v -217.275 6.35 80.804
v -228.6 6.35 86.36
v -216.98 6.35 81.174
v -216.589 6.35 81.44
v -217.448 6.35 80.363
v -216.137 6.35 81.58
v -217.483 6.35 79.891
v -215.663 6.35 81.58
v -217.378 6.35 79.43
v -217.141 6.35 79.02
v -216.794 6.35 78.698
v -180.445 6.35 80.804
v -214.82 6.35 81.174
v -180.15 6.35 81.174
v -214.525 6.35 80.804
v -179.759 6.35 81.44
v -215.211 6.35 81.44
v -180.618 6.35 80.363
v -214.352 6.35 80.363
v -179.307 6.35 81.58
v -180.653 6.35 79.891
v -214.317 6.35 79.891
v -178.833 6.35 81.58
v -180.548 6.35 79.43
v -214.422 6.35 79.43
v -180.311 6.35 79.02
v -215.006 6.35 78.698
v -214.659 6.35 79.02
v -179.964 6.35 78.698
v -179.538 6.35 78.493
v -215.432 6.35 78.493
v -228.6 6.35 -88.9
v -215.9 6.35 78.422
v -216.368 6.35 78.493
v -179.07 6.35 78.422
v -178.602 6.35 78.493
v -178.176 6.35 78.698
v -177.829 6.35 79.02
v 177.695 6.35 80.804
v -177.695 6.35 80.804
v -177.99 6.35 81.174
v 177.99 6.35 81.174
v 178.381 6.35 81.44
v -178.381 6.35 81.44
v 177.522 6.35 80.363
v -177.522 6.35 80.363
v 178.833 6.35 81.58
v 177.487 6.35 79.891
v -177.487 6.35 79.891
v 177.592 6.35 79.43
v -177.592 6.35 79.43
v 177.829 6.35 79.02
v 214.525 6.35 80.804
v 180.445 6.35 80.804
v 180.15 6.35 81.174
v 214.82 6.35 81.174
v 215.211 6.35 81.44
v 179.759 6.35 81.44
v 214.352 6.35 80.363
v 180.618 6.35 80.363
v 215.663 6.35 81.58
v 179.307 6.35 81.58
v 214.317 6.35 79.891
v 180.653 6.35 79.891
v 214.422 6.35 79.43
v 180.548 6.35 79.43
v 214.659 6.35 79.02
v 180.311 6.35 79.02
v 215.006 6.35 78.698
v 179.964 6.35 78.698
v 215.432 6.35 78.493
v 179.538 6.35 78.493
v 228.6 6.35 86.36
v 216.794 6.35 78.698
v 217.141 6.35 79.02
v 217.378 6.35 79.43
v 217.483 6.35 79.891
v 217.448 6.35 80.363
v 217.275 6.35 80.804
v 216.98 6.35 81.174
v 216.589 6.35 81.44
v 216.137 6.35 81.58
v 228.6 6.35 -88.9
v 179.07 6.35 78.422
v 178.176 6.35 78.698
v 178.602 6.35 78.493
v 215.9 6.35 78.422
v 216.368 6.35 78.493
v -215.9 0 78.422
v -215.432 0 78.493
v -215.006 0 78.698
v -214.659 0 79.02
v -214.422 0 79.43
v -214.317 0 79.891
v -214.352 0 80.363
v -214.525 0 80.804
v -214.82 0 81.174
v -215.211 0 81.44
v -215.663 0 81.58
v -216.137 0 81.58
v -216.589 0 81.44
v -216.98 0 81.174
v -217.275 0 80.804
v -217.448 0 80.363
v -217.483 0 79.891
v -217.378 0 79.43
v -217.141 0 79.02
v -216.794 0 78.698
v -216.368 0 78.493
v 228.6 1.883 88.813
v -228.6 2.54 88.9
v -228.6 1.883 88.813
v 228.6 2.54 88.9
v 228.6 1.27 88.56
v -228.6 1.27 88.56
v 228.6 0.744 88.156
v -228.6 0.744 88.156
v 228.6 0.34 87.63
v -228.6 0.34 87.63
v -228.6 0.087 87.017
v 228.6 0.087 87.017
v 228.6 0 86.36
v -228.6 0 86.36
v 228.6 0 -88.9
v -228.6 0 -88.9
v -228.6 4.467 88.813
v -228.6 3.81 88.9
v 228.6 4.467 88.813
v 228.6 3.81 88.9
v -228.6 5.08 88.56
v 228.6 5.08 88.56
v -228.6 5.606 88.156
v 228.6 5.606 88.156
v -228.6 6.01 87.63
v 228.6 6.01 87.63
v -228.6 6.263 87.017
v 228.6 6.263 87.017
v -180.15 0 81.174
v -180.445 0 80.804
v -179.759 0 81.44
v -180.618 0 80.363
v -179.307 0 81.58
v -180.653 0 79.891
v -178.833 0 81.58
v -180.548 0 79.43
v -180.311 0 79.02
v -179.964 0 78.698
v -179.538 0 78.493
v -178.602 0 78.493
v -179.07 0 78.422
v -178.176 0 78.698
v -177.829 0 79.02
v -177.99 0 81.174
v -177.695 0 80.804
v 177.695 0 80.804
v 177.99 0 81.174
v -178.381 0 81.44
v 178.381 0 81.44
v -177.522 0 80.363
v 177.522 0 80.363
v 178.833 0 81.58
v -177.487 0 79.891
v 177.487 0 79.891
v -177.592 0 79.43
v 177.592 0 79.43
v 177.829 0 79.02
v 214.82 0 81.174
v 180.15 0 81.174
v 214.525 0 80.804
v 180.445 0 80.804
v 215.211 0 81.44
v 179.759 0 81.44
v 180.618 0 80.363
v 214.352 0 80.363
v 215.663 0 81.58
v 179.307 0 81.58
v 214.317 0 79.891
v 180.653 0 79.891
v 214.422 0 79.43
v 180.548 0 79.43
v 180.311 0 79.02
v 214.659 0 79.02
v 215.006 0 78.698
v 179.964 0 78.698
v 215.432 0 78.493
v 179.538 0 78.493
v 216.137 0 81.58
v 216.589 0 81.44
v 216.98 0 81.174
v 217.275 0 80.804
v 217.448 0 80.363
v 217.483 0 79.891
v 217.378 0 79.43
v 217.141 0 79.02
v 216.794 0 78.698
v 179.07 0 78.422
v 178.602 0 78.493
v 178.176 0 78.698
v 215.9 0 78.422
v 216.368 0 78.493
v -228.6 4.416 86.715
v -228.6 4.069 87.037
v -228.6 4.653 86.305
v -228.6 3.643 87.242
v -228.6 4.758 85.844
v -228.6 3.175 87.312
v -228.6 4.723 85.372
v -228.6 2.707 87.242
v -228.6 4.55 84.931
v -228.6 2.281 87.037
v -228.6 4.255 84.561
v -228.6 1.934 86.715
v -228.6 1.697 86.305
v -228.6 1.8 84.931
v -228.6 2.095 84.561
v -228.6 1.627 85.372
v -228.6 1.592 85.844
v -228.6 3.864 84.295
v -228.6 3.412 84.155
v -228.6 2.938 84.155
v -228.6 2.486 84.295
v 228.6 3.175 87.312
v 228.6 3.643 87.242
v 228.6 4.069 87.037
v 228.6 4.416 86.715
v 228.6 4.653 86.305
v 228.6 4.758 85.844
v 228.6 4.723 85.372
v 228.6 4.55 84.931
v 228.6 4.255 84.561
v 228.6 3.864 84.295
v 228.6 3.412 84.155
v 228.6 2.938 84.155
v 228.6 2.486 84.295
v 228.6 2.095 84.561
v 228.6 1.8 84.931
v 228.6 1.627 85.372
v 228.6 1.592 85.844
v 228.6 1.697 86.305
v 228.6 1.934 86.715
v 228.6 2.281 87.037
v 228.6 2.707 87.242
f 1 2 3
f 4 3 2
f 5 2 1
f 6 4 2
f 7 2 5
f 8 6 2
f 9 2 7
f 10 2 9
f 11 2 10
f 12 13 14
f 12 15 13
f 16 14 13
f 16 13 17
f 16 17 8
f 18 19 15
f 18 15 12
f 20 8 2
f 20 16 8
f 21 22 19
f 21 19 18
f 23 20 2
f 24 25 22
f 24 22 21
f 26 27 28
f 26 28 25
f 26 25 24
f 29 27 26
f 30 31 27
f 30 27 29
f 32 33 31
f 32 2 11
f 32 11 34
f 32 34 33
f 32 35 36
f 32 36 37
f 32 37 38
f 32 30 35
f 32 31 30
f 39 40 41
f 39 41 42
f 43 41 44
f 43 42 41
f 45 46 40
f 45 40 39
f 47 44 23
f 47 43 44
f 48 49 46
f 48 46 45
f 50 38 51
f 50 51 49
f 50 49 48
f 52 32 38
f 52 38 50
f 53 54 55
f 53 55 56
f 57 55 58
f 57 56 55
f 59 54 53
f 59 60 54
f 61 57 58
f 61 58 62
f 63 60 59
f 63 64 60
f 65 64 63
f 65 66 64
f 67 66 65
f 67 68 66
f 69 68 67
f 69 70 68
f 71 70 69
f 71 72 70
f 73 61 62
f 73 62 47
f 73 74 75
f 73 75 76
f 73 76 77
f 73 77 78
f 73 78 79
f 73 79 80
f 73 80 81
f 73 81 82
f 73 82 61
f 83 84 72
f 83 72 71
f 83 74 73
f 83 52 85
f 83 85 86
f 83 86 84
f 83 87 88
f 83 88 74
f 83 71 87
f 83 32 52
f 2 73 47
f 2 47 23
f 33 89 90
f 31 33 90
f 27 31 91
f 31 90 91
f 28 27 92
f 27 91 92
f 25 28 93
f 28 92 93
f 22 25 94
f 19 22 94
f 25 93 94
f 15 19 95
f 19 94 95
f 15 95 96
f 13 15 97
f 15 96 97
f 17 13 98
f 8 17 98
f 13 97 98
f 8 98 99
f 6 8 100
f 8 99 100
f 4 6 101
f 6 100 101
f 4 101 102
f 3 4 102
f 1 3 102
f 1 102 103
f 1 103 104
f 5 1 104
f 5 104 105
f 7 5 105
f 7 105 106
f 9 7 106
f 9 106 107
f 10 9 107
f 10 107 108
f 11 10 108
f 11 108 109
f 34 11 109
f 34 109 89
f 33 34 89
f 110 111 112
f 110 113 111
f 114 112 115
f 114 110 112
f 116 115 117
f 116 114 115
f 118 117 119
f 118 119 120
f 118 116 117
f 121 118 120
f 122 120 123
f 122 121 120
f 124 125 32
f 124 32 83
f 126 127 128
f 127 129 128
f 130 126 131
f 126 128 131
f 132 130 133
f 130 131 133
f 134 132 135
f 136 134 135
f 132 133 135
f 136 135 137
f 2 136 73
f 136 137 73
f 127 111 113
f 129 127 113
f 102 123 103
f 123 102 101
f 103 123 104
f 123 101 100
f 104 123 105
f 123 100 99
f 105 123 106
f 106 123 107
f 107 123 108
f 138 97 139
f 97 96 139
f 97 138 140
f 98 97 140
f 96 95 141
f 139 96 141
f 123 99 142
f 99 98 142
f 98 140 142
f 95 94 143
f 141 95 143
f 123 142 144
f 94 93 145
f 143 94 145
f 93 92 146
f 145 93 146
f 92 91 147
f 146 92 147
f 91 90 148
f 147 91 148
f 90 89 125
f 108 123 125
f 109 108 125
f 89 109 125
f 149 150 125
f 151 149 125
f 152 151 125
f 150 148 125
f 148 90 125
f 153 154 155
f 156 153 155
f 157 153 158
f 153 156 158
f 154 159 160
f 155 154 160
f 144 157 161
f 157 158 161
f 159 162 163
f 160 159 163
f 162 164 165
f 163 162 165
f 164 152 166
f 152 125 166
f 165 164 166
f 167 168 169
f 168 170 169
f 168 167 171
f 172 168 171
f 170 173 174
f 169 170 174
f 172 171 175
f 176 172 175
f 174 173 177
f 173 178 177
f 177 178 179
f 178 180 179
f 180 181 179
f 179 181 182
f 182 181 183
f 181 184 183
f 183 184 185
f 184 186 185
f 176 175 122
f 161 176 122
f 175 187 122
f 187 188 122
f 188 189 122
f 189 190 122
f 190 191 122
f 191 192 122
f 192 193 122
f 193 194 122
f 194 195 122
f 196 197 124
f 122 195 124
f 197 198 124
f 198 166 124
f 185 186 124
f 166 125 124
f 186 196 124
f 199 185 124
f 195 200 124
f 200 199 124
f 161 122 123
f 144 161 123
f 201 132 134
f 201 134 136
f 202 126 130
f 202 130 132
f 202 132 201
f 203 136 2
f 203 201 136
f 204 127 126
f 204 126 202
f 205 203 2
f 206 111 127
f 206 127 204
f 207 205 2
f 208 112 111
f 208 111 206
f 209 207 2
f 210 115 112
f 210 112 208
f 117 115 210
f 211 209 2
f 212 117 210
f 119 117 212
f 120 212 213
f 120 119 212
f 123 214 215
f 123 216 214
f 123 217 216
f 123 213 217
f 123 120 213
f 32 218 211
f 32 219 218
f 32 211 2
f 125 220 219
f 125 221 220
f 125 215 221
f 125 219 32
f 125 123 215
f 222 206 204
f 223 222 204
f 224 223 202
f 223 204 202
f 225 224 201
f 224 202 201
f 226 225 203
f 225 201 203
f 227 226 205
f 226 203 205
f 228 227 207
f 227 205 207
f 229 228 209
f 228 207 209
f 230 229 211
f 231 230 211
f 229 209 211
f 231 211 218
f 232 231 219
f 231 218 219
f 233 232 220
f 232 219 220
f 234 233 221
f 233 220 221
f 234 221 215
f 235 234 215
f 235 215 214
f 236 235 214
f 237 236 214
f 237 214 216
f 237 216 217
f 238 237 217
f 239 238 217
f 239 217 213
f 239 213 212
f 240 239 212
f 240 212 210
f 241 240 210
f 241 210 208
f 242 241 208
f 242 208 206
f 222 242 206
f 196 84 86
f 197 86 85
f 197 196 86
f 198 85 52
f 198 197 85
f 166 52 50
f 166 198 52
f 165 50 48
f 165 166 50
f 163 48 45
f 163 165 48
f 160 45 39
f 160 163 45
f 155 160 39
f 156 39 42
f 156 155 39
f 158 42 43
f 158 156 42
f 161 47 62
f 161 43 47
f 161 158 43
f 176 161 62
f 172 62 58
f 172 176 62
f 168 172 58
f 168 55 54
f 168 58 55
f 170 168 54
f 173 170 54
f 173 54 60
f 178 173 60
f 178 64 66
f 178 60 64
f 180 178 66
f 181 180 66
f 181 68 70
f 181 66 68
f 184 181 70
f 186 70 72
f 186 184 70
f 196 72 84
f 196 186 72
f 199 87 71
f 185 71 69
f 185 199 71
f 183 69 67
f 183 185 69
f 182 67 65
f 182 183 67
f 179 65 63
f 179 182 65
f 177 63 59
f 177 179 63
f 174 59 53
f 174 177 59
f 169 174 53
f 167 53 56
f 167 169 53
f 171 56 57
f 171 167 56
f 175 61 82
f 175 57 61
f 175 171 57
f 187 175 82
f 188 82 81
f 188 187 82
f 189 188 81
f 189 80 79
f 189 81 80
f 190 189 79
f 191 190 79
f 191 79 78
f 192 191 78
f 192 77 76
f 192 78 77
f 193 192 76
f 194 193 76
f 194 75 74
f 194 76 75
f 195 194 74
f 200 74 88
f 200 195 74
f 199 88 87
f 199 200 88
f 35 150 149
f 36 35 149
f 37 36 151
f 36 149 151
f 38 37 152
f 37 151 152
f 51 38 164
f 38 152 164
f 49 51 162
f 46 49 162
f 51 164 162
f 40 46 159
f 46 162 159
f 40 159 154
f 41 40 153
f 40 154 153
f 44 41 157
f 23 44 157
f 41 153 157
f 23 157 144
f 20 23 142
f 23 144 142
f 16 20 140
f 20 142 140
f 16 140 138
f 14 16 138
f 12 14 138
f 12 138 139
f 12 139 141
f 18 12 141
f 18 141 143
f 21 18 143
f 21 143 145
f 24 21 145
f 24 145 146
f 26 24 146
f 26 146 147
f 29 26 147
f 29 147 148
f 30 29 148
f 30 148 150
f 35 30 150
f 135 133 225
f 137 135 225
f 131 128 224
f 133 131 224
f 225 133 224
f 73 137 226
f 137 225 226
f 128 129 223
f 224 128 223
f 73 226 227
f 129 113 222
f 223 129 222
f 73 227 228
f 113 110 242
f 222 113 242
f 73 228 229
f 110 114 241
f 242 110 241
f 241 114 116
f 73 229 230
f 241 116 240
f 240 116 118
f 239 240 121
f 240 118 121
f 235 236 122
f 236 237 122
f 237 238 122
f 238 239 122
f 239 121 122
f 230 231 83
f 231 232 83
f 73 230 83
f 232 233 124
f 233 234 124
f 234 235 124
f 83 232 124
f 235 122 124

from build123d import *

# Parameters (mm, degrees)
SKETCH1_W           = 457.2
SKETCH1_H           = 177.8
BOSS_EXTRUDE1_DEPTH = 6.35
SKETCH2_R           = 1.5875
CUT_EXTRUDE1_DEPTH  = 466.806153351
FILLET1_R           = 2.54
SKETCH4_R           = 1.5875
CUT_EXTRUDE3_DEPTH  = 246.359924397


with BuildPart() as part:
    # Sketch1 → Boss-Extrude1 (new body)
    with BuildSketch(Plane(origin=(0, 0, 0), x_dir=(1, 0, 0), z_dir=(0, 1, 0))):
        Rectangle(SKETCH1_W, SKETCH1_H)
    extrude(amount=BOSS_EXTRUDE1_DEPTH)

    # Sketch2 → Cut-Extrude1 (cut, through all)
    with BuildSketch(Plane.ZY.offset(228.6)):
        with Locations((85.725, 3.175)):
            Circle(SKETCH2_R)
    extrude(amount=-CUT_EXTRUDE1_DEPTH, mode=Mode.SUBTRACT)

    # Fillet1
    fillet1_edges = [part.edges().sort_by_distance(p)[0] for p in [
        (0, 6.35, 88.9),
        (0, 0, 88.9),
    ]]
    fillet(fillet1_edges, radius=FILLET1_R)

    # Sketch4 → Cut-Extrude3 (cut, through all)
    with BuildSketch(Plane.XZ):
        with Locations(Location((-179.07, 80.01, 0), (0, 0, 270))):
            Circle(SKETCH4_R)
        with Locations(Location((-215.9, 80.01, 0), (0, 0, 270))):
            Circle(SKETCH4_R)
    cut_extrude3 = extrude(amount=-CUT_EXTRUDE3_DEPTH, mode=Mode.SUBTRACT)

    # Mirror1: Cut-Extrude3 across plane
    add(cut_extrude3.mirror(Plane(origin=(0, 0, 0), x_dir=(0, 0, 1), z_dir=(1, 0, 0))), mode=Mode.SUBTRACT)


solid = part.part
